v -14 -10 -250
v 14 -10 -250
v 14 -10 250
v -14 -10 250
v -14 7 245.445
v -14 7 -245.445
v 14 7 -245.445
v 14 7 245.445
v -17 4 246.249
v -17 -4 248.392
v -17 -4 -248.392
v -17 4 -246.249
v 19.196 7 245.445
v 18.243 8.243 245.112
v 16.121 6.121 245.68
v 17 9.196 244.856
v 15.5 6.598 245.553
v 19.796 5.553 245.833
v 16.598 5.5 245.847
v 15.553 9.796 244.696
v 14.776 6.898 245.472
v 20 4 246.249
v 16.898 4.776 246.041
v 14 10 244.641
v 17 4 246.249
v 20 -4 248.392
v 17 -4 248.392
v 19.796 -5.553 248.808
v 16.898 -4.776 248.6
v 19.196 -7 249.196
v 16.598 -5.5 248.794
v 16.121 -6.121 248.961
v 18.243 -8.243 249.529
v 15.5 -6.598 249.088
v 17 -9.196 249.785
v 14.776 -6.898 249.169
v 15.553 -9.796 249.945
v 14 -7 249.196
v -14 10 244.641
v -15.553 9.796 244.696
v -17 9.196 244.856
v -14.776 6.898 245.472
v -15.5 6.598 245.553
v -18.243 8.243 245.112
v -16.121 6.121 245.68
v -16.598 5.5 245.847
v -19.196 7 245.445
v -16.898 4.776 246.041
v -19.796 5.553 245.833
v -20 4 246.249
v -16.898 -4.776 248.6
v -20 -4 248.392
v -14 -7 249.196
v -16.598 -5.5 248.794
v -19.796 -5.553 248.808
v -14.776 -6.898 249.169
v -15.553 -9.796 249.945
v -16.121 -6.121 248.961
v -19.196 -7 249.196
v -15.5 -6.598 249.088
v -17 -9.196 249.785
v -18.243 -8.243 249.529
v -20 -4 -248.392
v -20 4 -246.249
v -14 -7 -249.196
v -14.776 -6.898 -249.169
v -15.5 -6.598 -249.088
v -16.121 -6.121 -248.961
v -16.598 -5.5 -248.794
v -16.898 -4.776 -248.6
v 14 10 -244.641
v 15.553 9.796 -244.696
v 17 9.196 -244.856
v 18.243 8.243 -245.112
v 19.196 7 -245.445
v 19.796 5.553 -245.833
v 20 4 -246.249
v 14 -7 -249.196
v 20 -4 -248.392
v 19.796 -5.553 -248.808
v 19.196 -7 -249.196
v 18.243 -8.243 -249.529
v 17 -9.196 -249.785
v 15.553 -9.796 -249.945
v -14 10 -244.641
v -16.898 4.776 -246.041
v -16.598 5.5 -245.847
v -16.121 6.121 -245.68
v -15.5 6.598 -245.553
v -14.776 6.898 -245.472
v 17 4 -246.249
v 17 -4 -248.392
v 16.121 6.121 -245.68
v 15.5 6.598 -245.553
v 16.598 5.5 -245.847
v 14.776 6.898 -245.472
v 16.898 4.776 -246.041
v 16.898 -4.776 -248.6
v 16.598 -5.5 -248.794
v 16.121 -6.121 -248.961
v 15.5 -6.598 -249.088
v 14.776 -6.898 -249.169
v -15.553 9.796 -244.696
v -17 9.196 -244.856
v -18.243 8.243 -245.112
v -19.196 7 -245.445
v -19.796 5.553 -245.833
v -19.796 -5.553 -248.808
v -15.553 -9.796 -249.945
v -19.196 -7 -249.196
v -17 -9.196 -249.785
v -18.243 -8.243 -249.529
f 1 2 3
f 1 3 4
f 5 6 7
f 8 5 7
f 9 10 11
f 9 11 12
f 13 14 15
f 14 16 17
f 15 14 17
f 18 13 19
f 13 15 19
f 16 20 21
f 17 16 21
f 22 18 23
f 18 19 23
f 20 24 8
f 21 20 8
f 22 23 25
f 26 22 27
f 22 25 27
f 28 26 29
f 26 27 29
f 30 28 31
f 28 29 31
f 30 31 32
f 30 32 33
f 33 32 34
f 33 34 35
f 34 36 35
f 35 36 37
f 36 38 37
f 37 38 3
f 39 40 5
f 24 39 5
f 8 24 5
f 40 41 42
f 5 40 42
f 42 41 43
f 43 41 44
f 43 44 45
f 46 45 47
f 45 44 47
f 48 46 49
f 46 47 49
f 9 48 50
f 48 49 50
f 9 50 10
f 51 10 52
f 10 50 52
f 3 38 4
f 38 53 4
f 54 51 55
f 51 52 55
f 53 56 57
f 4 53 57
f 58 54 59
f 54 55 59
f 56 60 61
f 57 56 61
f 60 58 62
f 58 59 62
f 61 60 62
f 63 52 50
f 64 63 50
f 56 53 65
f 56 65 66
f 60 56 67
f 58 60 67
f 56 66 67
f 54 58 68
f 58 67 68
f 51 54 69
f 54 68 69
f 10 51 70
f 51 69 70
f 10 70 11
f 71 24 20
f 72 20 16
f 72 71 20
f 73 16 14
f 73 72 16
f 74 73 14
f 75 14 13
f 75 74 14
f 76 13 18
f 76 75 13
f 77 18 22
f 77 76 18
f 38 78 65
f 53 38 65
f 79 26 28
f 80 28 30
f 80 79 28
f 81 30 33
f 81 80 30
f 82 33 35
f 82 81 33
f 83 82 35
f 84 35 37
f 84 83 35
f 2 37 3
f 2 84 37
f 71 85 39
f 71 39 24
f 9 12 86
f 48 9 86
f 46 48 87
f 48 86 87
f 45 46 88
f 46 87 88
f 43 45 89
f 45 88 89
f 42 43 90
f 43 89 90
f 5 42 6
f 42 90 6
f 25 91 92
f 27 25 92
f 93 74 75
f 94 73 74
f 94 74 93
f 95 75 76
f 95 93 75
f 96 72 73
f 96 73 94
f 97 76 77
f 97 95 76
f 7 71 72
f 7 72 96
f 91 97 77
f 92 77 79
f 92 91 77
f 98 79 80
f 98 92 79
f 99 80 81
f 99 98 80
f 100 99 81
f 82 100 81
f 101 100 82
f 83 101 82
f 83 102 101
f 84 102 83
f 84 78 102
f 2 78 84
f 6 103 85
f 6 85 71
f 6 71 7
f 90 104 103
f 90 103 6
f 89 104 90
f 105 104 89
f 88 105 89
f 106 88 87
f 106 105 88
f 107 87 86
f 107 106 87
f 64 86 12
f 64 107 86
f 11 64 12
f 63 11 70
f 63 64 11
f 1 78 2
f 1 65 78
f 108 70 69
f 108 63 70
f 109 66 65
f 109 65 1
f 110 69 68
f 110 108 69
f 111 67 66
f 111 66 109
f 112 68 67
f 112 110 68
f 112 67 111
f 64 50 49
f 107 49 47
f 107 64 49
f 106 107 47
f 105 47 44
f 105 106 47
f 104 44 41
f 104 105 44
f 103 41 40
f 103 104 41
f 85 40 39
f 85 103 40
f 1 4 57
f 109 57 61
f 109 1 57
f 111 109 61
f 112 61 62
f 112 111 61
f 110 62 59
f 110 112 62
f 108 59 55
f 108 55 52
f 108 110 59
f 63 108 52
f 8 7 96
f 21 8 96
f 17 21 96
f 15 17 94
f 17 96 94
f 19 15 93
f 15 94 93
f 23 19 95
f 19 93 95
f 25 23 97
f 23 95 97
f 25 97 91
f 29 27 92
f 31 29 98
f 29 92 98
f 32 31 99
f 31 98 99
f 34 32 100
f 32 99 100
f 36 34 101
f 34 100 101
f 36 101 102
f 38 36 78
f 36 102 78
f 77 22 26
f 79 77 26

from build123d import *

# Parameters (mm, degrees)
EXTRUDE_1_DEPTH      = 250
EXTRUDE_1_DEPTH_BACK = 250
SHELL_1_T            = -3
CHAMFER_1_SIZE       = 5.358983849
CHAMFER_1_SIZE_2     = 20


with BuildPart() as part:
    # Эскиз1 → Бобышка-Вытянуть1 (new, two sides: drawn at the far end of the back side and taken through both)
    with BuildSketch(Plane.XY.offset(-EXTRUDE_1_DEPTH_BACK)):
        with BuildLine():
            Line((-14, 10), (14, 10))
            ThreePointArc((14, 10), (18.242640687, 8.242640687), (20, 4))
            Line((20, 4), (20, -4))
            ThreePointArc((20, -4), (18.242640687, -8.242640687), (14, -10))
            Line((14, -10), (-14, -10))
            ThreePointArc((-14, -10), (-18.242640687, -8.242640687), (-20, -4))
            Line((-20, -4), (-20, 4))
            ThreePointArc((-20, 4), (-18.242640687, 8.242640687), (-14, 10))
        make_face()
    extrude(amount=EXTRUDE_1_DEPTH + EXTRUDE_1_DEPTH_BACK)

    # Оболочка1
    shell_1_openings = [part.faces().sort_by_distance(p)[0] for p in [
        (0, 0, -250),
        (0, 0, 250),
    ]]
    offset(amount=SHELL_1_T, openings=shell_1_openings, kind=Kind.INTERSECTION)

    # Фаска1
    # the kernel refuses this chamfer: 20, 5.358983849 mm, written as the material it takes off along each edge
    with BuildSketch(Plane(origin=(-65.934431404, 10, -250), x_dir=(0, 0.1375124470212891, 0.9905000388259543), z_dir=(1, 0, 0))) as chamfer_1_piece_1:
        Polygon((CHAMFER_1_SIZE * 0.990500038756, CHAMFER_1_SIZE * 0.137512447012), (-CHAMFER_1_SIZE_2 * 0.137512447021, CHAMFER_1_SIZE_2 * 0.990500038826), (0, 0), align=None)
    extrude(amount=131.868862808, mode=Mode.SUBTRACT)
    with BuildSketch(Plane(origin=(-65.934431404, 10, 250), x_dir=(0, 0.1375124470212891, -0.9905000388259543), z_dir=(1, 0, 0))) as chamfer_1_piece_2:
        Polygon((CHAMFER_1_SIZE * 0.990500038756, -CHAMFER_1_SIZE * 0.137512447012), (-CHAMFER_1_SIZE_2 * 0.137512447021, -CHAMFER_1_SIZE_2 * 0.990500038826), (0, 0), align=None)
    extrude(amount=131.868862808, mode=Mode.SUBTRACT)


solid = part.part
